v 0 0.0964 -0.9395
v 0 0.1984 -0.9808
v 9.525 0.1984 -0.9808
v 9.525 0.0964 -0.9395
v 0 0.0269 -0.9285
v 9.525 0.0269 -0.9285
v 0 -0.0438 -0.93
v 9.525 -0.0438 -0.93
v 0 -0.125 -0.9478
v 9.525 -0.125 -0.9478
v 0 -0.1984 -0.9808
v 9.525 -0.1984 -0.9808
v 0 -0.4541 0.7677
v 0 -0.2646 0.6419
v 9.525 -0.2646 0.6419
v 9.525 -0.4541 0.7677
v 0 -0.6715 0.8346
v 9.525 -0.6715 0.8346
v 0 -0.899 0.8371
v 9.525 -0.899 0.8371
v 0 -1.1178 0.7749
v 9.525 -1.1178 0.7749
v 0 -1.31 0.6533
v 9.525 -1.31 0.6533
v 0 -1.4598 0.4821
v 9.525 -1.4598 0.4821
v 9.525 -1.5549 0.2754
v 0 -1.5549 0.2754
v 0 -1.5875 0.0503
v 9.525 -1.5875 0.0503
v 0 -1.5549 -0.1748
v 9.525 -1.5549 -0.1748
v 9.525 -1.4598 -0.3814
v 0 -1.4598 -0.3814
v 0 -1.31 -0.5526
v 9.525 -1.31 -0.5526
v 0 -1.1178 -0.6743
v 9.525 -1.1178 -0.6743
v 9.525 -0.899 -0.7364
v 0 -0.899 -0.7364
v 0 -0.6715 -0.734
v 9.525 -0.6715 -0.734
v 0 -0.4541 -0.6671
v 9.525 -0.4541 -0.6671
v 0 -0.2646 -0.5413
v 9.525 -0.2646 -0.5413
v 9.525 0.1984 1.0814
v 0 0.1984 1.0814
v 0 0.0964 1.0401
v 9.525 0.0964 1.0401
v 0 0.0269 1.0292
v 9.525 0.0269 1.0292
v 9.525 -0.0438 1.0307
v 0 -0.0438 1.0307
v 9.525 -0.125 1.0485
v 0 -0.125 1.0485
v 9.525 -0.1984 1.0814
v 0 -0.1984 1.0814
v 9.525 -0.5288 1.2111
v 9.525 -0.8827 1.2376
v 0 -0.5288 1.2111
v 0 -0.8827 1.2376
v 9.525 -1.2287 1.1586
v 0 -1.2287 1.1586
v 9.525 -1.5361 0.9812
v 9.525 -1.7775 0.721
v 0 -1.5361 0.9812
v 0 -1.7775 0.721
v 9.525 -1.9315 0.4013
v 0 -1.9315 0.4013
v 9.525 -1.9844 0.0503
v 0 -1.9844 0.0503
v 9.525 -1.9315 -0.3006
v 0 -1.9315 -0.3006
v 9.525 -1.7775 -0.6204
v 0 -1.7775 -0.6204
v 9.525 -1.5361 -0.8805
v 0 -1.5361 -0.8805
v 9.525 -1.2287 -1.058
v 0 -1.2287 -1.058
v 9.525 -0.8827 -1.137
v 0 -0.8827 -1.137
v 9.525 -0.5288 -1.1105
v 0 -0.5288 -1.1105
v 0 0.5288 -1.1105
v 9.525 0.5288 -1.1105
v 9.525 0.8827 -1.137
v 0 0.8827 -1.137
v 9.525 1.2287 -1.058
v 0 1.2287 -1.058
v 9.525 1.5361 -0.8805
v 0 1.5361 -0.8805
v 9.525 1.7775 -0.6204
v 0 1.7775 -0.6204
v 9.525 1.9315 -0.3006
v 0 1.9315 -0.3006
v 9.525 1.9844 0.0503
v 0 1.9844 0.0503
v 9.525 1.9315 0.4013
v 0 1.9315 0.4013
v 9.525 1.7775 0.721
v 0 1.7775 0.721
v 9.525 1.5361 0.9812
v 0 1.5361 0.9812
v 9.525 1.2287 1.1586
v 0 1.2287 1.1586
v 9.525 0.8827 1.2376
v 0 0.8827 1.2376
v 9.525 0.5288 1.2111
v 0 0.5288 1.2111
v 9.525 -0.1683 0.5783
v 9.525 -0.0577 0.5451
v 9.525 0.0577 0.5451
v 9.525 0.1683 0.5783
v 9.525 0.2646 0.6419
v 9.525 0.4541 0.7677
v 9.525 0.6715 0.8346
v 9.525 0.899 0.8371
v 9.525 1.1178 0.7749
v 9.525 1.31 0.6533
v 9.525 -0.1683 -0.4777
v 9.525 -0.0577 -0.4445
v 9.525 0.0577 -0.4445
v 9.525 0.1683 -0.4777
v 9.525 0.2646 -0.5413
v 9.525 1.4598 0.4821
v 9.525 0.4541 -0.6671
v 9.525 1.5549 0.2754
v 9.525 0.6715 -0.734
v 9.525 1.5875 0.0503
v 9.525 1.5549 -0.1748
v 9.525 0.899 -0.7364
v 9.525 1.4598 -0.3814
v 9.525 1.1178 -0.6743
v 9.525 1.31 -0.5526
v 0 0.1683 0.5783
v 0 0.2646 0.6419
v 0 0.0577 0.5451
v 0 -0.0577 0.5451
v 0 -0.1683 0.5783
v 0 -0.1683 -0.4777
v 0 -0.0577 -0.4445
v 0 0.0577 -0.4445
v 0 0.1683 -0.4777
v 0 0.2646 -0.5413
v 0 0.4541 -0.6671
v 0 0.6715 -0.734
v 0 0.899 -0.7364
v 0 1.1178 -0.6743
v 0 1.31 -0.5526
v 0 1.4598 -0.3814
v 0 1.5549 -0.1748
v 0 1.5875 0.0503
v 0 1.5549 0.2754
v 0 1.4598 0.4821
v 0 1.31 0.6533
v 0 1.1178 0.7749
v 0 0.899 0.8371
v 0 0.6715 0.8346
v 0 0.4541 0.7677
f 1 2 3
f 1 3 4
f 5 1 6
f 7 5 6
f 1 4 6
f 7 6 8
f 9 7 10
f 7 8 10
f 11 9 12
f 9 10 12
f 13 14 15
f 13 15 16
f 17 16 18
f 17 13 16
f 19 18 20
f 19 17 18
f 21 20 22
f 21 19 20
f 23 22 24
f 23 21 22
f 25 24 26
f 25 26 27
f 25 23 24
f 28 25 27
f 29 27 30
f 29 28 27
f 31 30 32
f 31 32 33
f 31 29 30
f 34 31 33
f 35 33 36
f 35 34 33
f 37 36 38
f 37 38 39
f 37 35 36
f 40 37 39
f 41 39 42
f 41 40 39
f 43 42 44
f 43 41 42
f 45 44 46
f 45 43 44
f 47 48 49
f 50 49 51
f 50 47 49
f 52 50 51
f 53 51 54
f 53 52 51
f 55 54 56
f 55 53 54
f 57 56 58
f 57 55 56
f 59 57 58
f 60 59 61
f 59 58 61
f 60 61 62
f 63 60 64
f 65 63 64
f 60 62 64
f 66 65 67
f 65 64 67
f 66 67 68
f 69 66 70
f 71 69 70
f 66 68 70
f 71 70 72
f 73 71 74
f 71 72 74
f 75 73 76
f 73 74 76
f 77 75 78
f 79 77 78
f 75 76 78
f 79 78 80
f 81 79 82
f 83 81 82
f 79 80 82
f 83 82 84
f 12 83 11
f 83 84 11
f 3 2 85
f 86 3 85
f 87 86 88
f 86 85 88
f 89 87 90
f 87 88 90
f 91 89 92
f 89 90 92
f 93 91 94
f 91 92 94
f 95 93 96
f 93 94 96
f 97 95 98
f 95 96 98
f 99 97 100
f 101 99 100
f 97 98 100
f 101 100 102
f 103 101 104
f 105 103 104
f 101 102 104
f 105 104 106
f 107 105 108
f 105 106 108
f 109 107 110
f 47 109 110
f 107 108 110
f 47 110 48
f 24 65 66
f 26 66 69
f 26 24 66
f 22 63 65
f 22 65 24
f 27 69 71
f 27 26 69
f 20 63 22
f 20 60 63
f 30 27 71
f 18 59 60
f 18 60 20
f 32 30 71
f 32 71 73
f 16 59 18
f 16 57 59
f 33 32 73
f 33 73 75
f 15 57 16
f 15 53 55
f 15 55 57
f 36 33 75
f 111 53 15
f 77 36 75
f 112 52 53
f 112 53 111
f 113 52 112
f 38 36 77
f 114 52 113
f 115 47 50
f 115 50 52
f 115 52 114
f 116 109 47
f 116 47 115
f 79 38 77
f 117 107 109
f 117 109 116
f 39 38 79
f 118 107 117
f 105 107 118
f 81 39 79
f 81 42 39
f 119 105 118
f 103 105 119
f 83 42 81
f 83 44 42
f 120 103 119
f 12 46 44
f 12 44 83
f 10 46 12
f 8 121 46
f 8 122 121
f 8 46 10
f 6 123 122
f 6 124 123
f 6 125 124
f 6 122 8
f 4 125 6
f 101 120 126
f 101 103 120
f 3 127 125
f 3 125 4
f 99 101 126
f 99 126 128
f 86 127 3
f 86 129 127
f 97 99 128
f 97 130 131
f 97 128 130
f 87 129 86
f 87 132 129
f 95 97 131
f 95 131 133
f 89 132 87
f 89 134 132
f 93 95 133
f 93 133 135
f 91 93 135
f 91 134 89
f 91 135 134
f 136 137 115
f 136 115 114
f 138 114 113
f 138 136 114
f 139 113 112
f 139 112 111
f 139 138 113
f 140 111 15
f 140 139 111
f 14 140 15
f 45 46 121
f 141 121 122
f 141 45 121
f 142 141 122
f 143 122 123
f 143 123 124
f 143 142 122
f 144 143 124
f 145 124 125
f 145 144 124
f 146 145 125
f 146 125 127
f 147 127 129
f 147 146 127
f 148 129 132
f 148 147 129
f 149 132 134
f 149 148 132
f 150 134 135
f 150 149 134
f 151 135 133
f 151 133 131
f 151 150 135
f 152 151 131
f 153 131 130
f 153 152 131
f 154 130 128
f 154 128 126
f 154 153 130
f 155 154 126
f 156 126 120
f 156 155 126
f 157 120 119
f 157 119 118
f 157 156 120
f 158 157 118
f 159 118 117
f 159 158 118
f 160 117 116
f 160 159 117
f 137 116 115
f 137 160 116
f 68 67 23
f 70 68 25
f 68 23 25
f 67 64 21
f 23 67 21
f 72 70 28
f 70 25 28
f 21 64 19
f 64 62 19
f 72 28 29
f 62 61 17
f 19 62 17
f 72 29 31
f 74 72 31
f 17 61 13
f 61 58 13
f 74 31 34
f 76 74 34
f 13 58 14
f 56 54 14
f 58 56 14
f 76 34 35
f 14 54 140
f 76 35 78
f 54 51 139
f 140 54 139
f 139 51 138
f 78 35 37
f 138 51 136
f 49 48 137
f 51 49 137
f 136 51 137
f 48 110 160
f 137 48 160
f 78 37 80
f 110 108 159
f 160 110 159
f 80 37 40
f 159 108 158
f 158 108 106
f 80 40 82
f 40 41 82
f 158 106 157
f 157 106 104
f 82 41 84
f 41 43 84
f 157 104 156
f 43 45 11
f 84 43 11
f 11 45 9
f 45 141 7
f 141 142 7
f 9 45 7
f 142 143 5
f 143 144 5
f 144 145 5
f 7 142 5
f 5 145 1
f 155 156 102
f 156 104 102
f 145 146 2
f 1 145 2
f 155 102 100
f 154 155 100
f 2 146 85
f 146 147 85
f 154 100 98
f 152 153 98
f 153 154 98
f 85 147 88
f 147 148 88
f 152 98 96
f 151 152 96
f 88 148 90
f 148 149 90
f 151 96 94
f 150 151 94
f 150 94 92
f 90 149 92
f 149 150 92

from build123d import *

# Parameters (mm, degrees)
BOSS_EXTRUDE1_DEPTH = 9.525
FILLET1_R           = 0.396875


with BuildPart() as part:
    # Sketch1 → Boss-Extrude1 (new body)
    with BuildSketch(Plane(origin=(0, 0, 0), x_dir=(0, 0, -1), z_dir=(1, 0, 0))):
        with BuildLine():
            ThreePointArc((0.83712048, 0), (-0.050318999, 1.984375), (-0.937758477, 0))
            ThreePointArc((-0.937758477, 0), (-0.050318999, -1.984375), (0.83712048, 0))
        make_face()
        with BuildLine():
            ThreePointArc((0.54130732, 0.264583333), (-0.050318999, 1.5875), (-0.641945318, 0.264583333))
            ThreePointArc((-0.641945318, 0.264583333), (-0.540883477, 0), (-0.641945318, -0.264583333))
            ThreePointArc((-0.641945318, -0.264583333), (-0.050318999, -1.5875), (0.54130732, -0.264583333))
            ThreePointArc((0.54130732, -0.264583333), (0.44024548, 0), (0.54130732, 0.264583333))
        make_face(mode=Mode.SUBTRACT)
    extrude(amount=BOSS_EXTRUDE1_DEPTH)

    # Fillet1
    fillet1_edges = [part.edges().sort_by_distance(p)[0] for p in [
        (4.7625, 0, 0.937758477),
        (4.7625, 0, -0.83712048),
    ]]
    fillet(fillet1_edges, radius=FILLET1_R)


solid = part.part
